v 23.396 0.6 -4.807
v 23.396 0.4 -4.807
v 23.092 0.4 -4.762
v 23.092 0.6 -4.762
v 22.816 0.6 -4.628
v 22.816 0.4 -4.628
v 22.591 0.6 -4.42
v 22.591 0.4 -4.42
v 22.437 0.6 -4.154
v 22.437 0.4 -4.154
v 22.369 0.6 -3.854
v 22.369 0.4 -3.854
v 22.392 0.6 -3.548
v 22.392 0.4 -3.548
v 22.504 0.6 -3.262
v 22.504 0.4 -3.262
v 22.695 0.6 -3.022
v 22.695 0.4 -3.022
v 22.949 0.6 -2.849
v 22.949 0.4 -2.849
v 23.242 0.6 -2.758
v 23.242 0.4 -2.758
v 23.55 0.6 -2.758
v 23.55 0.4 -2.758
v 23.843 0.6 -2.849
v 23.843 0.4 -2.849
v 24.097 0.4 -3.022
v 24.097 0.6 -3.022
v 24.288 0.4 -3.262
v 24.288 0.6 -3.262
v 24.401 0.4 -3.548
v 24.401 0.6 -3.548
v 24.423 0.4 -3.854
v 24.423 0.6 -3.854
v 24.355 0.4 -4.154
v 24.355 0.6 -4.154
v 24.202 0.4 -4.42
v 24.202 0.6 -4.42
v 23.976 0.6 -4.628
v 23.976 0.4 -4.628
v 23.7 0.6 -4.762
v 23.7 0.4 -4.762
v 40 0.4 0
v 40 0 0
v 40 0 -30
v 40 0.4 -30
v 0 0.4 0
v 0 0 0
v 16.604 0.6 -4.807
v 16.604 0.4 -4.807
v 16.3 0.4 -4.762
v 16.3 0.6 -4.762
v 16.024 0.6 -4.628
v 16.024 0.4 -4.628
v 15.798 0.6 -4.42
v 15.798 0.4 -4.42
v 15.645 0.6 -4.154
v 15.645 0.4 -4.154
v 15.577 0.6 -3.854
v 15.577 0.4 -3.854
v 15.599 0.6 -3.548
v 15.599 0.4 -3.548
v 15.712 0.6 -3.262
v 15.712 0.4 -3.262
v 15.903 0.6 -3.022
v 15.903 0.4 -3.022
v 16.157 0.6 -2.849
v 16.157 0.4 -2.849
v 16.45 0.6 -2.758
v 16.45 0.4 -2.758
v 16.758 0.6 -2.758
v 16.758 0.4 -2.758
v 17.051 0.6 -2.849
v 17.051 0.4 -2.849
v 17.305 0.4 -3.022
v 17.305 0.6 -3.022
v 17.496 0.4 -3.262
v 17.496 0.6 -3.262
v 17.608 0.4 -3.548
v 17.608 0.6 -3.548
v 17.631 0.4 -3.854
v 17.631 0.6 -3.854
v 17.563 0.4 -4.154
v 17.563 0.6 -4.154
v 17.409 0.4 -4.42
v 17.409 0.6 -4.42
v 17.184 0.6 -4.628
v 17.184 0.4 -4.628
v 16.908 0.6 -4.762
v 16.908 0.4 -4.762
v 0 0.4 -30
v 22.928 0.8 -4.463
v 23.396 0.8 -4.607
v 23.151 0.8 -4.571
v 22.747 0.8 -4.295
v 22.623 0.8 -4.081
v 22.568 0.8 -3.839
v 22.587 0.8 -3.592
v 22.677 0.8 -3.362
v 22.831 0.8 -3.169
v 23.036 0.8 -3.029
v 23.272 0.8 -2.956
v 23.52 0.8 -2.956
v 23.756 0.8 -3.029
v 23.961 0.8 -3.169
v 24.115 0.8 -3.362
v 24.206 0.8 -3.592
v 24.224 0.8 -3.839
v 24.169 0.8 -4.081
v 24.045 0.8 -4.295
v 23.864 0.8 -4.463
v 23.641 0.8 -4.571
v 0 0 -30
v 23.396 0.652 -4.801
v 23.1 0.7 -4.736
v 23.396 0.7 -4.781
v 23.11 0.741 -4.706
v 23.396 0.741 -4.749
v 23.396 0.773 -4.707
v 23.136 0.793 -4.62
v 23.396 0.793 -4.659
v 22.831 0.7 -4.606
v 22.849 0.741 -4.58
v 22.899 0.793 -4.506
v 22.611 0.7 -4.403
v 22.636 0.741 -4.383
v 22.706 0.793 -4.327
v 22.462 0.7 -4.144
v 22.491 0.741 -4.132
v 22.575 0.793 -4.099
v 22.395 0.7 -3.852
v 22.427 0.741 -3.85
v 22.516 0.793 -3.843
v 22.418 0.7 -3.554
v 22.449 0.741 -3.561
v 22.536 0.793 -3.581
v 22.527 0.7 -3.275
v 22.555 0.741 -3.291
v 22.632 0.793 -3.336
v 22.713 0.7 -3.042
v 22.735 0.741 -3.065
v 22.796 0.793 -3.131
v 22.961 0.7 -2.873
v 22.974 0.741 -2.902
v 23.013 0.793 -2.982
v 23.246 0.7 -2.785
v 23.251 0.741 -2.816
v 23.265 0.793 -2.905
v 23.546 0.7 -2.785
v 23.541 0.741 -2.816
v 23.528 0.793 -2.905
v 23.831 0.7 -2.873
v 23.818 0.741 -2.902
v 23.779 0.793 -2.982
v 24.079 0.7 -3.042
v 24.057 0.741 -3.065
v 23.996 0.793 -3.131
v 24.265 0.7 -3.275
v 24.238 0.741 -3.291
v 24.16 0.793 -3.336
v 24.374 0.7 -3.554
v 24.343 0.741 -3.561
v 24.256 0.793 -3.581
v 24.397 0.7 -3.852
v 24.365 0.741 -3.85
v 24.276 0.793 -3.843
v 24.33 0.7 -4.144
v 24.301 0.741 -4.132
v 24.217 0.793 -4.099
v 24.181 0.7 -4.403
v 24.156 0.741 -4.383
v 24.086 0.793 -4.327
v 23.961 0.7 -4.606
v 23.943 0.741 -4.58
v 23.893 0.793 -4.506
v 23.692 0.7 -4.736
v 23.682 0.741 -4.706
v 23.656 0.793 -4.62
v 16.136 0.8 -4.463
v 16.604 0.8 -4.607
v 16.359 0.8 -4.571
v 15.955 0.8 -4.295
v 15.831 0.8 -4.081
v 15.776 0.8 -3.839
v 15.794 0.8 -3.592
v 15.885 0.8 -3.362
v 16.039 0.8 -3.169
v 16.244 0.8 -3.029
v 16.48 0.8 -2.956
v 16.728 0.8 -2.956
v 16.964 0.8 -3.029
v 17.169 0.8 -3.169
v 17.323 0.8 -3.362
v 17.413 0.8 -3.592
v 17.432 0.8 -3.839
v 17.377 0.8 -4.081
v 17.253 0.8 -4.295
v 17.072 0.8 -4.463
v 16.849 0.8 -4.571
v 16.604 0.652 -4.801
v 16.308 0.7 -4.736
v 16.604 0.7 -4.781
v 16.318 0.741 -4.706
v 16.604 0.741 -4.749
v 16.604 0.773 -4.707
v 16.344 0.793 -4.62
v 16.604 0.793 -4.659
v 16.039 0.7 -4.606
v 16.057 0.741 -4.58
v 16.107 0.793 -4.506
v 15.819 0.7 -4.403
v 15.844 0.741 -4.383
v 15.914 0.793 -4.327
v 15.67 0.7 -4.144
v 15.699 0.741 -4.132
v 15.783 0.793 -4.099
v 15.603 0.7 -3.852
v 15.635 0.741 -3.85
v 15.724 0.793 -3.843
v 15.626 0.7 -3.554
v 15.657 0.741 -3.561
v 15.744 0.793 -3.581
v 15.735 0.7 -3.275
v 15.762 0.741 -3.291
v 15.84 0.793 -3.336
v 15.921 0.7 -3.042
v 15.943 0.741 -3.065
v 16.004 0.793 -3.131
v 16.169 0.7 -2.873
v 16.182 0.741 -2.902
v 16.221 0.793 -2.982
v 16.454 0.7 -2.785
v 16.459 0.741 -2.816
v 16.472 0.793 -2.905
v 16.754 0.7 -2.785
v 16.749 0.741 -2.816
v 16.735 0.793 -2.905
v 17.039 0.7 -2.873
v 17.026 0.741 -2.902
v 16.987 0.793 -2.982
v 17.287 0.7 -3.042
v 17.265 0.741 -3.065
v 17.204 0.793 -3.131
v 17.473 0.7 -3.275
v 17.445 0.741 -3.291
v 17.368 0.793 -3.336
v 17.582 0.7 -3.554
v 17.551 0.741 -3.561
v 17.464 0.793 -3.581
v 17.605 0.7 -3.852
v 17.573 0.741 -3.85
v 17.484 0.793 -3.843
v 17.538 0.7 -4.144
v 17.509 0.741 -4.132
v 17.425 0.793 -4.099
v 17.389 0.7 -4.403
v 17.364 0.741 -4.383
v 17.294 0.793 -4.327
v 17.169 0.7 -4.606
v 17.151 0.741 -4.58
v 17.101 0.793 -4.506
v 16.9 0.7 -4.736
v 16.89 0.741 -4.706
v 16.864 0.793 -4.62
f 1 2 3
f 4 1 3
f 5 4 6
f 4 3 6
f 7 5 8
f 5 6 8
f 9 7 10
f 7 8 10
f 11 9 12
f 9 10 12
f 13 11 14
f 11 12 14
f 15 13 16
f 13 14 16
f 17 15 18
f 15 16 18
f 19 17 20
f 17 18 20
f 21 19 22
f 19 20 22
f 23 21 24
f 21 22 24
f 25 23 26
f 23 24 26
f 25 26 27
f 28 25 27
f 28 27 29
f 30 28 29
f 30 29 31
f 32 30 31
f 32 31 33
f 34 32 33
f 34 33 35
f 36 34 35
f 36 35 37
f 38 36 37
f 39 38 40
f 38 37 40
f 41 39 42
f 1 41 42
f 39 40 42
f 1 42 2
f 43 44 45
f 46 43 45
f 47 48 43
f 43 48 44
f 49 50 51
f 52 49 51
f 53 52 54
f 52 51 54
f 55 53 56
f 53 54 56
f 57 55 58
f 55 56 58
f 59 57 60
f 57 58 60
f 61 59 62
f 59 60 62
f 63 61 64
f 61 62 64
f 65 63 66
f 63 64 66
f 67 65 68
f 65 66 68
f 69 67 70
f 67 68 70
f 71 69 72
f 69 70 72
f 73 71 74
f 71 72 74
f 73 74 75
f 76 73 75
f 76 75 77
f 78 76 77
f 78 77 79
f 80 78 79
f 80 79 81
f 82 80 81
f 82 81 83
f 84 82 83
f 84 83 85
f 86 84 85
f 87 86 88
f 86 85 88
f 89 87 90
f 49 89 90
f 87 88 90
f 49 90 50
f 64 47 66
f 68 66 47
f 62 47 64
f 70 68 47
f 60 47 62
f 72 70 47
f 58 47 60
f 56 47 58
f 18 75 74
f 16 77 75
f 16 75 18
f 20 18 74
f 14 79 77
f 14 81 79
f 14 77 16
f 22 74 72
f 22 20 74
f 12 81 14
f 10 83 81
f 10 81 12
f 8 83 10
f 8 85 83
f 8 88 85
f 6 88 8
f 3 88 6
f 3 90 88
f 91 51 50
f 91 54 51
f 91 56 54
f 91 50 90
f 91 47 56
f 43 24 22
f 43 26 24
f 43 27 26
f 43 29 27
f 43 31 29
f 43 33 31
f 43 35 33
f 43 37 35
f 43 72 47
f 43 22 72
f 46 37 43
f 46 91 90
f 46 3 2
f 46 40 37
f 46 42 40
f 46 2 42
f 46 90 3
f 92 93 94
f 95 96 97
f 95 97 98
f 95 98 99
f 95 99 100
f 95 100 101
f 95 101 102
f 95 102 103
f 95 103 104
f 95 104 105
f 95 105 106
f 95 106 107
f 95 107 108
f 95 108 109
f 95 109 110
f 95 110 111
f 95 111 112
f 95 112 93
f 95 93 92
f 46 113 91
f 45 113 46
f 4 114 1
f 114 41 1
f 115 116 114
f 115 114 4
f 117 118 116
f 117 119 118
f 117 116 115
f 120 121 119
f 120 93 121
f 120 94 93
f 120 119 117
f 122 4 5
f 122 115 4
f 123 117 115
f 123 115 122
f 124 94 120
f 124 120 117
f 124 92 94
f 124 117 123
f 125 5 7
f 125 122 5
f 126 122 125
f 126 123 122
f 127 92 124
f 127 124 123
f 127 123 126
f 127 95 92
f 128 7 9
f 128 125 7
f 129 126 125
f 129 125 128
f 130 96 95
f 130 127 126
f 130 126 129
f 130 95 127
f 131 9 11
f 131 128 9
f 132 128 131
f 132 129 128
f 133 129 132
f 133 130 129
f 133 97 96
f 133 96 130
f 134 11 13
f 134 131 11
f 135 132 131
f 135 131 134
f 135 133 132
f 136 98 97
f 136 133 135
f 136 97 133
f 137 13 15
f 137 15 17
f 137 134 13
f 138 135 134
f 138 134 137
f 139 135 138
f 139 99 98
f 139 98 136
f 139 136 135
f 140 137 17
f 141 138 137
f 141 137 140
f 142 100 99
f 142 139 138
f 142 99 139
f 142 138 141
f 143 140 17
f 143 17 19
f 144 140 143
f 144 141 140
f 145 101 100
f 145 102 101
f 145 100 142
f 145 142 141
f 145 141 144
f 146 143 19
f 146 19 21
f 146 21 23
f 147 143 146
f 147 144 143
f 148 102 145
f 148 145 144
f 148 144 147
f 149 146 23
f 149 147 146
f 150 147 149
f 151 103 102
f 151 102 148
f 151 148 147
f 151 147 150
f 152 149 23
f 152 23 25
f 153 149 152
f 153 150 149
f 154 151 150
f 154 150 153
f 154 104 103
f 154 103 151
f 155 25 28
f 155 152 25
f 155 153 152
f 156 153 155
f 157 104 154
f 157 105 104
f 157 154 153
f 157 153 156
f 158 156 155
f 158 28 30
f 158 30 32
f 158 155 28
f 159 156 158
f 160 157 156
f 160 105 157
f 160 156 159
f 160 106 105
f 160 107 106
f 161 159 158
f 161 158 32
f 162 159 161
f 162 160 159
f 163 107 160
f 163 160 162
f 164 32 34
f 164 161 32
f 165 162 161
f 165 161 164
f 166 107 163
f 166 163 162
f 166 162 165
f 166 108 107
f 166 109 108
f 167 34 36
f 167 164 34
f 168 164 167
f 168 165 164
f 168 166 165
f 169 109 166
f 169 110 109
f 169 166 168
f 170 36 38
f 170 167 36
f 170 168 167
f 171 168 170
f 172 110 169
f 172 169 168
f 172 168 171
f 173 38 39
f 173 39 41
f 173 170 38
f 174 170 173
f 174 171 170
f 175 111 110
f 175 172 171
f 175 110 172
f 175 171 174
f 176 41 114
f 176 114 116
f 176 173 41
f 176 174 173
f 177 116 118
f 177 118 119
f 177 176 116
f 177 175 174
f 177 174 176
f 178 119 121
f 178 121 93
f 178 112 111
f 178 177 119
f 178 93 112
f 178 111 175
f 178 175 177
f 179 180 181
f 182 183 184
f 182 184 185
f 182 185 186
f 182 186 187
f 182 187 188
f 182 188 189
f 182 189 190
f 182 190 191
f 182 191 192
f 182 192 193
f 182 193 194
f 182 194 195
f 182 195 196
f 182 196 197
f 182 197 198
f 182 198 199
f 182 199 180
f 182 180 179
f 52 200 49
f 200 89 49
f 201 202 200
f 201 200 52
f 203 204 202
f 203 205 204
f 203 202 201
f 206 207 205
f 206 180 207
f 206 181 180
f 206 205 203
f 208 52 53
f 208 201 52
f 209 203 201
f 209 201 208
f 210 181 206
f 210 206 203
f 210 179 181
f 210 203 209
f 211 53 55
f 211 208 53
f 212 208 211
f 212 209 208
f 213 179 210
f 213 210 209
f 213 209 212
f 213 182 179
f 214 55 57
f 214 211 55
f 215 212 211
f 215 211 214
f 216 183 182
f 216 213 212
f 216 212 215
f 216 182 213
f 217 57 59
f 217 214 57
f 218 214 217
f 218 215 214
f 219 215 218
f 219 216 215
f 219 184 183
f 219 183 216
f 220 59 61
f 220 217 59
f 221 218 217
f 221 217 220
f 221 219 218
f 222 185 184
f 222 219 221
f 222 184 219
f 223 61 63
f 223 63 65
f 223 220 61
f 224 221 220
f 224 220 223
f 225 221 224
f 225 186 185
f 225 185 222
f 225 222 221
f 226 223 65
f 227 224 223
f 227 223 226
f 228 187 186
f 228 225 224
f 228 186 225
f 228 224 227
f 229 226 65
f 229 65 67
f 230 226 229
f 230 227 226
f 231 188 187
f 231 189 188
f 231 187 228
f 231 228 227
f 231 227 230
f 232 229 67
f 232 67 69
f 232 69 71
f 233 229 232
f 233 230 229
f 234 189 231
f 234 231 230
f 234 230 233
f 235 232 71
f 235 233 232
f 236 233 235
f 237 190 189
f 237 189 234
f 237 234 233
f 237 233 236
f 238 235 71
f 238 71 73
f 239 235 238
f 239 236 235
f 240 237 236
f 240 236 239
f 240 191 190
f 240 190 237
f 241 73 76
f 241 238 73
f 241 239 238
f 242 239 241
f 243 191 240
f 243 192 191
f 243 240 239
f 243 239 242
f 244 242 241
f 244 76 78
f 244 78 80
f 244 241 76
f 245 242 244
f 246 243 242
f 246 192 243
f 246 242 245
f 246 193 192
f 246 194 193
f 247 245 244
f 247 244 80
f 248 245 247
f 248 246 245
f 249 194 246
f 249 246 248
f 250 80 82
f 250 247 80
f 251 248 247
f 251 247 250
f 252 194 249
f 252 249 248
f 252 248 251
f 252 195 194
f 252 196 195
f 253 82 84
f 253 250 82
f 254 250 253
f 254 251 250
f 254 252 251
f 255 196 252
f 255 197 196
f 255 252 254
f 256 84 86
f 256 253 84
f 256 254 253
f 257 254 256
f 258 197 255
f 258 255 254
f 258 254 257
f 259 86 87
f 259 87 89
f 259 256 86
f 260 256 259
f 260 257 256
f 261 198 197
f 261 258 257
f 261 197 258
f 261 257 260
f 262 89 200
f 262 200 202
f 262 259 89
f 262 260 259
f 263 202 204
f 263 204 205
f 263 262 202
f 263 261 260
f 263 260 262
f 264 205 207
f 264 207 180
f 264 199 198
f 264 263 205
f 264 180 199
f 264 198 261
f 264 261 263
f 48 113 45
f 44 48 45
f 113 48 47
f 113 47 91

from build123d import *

# Parameters (mm, degrees)
SKETCH1_W           = 40
SKETCH1_H           = 30
BOSS_EXTRUDE1_DEPTH = 0.4
SKETCH2_R           = 1.030298152
BOSS_EXTRUDE2_DEPTH = 0.4
FILLET1_R           = 0.2


with BuildPart() as part:
    # Sketch1 → Boss-Extrude1 (new body)
    with BuildSketch(Plane(origin=(0, 0, 0), x_dir=(1, 0, 0), z_dir=(0, 1, 0))):
        with Locations((20, 15)):
            Rectangle(SKETCH1_W, SKETCH1_H)
    extrude(amount=BOSS_EXTRUDE1_DEPTH)

    # Sketch2 → Boss-Extrude2 (add)
    with BuildSketch(Plane(origin=(0, 0.4, 0), x_dir=(1, 0, 0), z_dir=(0, 1, 0))):
        with Locations(Location((16.603964513, 3.777163976, 0), (0, 0, 90))):
            Circle(SKETCH2_R)
        with Locations(Location((23.396035487, 3.777163976, 0), (0, 0, 90))):
            Circle(SKETCH2_R)
    extrude(amount=BOSS_EXTRUDE2_DEPTH)

    # Fillet1
    fillet1_edges = [part.edges().sort_by_distance(p)[0] for p in [
        (16.603964513, 0.8, -2.746865824),
        (23.396035487, 0.8, -2.746865824),
    ]]
    fillet(fillet1_edges, radius=FILLET1_R)


solid = part.part
